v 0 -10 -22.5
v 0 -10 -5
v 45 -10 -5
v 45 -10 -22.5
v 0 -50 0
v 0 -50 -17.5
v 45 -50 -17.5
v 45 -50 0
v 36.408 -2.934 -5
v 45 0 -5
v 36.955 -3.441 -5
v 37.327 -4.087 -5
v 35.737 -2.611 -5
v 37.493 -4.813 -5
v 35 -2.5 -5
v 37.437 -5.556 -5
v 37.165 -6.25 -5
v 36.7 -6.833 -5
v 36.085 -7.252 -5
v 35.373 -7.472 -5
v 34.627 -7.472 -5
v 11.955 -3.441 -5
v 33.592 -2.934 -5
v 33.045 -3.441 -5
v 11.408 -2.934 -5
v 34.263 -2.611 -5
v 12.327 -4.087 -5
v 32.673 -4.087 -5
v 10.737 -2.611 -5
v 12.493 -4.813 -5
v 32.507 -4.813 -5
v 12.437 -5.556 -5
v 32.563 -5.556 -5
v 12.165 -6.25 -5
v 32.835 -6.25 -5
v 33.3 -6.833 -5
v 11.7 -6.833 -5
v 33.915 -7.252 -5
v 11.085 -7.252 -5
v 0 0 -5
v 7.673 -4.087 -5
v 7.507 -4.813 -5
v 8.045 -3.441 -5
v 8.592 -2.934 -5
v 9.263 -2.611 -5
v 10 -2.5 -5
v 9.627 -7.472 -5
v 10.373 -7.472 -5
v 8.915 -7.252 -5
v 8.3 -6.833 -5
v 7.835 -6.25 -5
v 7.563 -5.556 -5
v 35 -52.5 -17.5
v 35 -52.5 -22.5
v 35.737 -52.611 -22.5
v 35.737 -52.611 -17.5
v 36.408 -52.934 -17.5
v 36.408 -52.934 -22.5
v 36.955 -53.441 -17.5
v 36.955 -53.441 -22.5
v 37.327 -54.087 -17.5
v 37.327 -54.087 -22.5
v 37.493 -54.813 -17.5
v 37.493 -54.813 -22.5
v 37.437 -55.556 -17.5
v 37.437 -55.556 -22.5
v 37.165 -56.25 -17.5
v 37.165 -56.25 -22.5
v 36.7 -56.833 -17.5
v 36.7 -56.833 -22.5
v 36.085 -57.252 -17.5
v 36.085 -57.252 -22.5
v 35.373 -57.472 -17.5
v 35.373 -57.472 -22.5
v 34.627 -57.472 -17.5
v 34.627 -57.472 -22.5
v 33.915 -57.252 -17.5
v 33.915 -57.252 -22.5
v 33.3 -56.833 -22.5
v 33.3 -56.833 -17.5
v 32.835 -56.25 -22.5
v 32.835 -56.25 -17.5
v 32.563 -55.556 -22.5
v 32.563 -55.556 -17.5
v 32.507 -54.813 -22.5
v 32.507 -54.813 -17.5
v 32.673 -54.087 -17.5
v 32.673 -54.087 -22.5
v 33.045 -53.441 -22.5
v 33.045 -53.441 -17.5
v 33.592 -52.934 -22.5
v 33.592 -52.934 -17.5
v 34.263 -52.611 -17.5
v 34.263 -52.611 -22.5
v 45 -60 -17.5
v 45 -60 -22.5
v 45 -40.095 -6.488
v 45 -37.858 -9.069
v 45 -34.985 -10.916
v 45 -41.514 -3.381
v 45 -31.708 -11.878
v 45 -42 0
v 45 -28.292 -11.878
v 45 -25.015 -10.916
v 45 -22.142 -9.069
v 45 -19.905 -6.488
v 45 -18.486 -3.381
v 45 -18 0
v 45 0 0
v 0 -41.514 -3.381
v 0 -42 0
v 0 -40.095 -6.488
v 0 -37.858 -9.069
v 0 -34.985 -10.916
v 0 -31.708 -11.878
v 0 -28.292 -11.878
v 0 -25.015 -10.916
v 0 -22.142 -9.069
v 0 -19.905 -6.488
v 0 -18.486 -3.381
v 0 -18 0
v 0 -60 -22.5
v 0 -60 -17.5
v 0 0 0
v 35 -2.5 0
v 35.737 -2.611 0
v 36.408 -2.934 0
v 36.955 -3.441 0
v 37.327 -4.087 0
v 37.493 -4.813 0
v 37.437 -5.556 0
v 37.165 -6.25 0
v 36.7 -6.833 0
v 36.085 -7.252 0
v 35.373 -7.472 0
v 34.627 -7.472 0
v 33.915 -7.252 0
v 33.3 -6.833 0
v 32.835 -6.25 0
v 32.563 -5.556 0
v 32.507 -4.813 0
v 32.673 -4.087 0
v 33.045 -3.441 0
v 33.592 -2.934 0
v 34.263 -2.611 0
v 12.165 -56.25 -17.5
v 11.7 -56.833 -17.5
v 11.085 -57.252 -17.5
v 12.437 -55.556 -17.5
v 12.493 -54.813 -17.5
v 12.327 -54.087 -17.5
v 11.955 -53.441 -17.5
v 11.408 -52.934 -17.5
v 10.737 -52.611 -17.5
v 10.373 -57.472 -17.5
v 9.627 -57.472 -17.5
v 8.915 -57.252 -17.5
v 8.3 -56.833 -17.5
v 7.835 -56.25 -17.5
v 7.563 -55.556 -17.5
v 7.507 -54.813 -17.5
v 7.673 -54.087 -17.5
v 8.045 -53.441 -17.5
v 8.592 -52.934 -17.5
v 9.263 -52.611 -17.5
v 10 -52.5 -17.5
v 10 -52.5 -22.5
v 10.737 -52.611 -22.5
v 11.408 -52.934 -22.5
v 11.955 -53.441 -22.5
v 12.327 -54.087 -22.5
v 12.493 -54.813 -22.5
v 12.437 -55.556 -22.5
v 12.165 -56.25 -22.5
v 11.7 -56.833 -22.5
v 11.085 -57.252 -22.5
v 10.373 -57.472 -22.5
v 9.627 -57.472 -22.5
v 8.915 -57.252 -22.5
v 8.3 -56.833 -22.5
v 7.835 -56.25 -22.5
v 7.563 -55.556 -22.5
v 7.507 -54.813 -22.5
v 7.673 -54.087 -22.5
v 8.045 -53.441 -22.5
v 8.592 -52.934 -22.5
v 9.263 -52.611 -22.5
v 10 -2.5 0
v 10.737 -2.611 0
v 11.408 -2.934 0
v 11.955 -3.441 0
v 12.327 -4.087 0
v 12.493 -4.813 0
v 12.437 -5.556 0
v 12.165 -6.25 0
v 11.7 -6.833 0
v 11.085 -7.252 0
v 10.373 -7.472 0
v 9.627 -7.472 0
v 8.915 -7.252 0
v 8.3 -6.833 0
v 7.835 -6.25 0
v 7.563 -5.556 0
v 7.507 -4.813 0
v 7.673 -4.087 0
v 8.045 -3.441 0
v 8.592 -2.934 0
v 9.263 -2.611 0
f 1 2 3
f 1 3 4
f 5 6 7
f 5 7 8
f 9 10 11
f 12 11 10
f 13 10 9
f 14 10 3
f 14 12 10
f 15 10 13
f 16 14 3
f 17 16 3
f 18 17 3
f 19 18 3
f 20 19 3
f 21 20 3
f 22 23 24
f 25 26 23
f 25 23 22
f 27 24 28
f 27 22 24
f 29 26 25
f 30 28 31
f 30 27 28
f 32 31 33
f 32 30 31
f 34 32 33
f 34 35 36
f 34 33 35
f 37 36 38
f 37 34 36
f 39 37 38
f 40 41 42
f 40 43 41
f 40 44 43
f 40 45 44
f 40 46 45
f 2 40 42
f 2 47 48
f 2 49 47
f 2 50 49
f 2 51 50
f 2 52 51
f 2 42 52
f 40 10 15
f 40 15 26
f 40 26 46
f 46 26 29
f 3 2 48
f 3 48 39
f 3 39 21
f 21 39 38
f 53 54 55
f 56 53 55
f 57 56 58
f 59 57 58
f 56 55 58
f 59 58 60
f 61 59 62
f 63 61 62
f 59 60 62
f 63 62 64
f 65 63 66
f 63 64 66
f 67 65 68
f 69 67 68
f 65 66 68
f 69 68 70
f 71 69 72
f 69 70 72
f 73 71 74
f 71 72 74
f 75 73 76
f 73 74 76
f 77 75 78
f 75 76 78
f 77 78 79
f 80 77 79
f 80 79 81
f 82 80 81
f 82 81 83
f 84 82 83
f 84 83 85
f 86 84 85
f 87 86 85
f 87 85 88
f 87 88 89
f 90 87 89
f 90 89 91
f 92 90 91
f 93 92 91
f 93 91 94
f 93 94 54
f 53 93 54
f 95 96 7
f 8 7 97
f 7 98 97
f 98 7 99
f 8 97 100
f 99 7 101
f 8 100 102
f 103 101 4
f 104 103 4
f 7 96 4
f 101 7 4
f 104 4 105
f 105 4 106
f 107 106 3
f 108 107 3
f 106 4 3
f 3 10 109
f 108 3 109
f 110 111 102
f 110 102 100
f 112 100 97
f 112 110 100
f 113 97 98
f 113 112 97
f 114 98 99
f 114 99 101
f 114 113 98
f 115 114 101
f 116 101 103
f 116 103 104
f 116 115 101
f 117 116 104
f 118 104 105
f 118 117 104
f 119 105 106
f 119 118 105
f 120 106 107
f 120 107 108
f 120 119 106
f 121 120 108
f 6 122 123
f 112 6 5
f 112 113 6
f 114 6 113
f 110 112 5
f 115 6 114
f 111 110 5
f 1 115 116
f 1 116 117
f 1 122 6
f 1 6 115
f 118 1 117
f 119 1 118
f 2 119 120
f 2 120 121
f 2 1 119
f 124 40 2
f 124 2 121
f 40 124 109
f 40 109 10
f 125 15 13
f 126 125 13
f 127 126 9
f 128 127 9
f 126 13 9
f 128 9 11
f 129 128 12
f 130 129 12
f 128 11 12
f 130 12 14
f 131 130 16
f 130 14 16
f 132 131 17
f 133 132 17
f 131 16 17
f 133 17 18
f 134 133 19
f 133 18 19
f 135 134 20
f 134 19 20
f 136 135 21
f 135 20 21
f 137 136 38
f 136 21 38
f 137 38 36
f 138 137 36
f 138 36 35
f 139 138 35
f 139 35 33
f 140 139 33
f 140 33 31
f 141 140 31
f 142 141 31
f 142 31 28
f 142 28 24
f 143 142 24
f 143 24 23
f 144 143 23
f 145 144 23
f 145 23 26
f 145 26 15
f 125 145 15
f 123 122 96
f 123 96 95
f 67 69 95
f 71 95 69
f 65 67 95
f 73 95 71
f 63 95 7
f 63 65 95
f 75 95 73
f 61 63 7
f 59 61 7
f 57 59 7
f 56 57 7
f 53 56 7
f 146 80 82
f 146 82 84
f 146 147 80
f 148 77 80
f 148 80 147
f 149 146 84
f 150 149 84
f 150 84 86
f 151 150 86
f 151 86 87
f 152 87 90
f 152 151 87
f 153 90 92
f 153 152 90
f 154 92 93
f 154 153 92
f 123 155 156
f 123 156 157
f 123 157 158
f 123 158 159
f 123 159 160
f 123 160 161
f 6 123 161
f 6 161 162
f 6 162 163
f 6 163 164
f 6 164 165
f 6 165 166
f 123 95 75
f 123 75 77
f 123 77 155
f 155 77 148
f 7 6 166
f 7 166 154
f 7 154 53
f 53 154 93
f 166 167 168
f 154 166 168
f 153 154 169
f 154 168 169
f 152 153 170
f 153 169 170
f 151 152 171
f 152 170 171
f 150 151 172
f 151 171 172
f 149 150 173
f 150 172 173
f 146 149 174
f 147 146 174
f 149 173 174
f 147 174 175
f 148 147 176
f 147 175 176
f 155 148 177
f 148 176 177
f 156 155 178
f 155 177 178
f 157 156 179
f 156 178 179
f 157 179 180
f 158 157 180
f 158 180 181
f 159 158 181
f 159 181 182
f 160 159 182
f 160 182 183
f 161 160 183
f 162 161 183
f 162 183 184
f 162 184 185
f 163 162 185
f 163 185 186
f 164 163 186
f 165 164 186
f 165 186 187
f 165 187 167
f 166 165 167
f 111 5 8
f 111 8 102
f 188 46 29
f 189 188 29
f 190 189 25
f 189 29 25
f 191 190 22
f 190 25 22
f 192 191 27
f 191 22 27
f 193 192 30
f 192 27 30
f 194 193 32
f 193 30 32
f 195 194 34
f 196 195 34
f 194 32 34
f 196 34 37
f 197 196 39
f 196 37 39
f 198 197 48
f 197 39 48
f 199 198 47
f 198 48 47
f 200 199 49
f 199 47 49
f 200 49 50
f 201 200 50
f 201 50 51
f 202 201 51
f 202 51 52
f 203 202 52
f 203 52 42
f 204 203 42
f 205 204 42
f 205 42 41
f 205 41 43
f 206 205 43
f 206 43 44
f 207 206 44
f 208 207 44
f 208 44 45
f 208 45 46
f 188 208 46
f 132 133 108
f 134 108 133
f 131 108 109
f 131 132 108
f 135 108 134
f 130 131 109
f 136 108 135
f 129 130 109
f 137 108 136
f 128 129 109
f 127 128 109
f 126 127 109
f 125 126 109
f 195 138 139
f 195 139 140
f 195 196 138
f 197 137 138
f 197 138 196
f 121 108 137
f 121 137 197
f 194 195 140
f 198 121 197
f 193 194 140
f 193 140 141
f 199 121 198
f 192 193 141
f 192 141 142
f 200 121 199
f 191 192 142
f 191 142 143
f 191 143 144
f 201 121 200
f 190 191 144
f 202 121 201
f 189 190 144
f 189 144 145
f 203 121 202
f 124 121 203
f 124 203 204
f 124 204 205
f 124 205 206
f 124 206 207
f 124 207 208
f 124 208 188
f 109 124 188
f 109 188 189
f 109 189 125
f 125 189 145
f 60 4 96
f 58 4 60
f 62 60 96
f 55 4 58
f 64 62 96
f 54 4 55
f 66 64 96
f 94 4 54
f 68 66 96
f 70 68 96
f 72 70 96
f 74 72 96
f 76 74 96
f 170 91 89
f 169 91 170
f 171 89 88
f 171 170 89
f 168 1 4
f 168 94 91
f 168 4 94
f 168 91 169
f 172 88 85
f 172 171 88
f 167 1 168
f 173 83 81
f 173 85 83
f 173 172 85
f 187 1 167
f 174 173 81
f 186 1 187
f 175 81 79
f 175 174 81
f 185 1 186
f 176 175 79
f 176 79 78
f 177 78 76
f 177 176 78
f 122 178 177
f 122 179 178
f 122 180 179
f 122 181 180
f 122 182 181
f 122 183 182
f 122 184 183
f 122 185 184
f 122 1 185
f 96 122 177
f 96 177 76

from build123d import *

# Parameters (mm, degrees)
EXTRUDE_1_DEPTH     = 45
SKETCH_2_R          = 2.5
CUT_EXTRUDE_1_DEPTH = 79.302298817


with BuildPart() as part:
    # 草图1 → 凸台-拉伸1 (new body)
    with BuildSketch(Plane(origin=(0, 0, 0), x_dir=(0, 0, -1), z_dir=(1, 0, 0))):
        with BuildLine():
            Line((0, 0), (5, 0))
            Line((5, 0), (5, -10))
            Line((5, -10), (22.5, -10))
            Line((22.5, -10), (22.5, -60))
            Line((22.5, -60), (17.5, -60))
            Line((17.5, -60), (17.5, -50))
            Line((17.5, -50), (0, -50))
            Line((0, -50), (0, -42))
            ThreePointArc((0, -42), (12, -30), (0, -18))
            Line((0, -18), (0, 0))
        make_face()
    extrude(amount=EXTRUDE_1_DEPTH)

    # 草图2 → 切除-拉伸1 (cut, through all)
    with BuildSketch(Plane(origin=(0, 0, -22.5), x_dir=(-1, 0, 0), z_dir=(0, 0, -1))):
        with Locations(Location((-35, -55, 0), (0, 0, 90))):
            Circle(SKETCH_2_R)
        with Locations(Location((-10, -5, 0), (0, 0, 90))):
            Circle(SKETCH_2_R)
        with Locations(Location((-10, -55, 0), (0, 0, 90))):
            Circle(SKETCH_2_R)
        with Locations(Location((-35, -5, 0), (0, 0, 90))):
            Circle(SKETCH_2_R)
    extrude(amount=-CUT_EXTRUDE_1_DEPTH, mode=Mode.SUBTRACT)


solid = part.part
